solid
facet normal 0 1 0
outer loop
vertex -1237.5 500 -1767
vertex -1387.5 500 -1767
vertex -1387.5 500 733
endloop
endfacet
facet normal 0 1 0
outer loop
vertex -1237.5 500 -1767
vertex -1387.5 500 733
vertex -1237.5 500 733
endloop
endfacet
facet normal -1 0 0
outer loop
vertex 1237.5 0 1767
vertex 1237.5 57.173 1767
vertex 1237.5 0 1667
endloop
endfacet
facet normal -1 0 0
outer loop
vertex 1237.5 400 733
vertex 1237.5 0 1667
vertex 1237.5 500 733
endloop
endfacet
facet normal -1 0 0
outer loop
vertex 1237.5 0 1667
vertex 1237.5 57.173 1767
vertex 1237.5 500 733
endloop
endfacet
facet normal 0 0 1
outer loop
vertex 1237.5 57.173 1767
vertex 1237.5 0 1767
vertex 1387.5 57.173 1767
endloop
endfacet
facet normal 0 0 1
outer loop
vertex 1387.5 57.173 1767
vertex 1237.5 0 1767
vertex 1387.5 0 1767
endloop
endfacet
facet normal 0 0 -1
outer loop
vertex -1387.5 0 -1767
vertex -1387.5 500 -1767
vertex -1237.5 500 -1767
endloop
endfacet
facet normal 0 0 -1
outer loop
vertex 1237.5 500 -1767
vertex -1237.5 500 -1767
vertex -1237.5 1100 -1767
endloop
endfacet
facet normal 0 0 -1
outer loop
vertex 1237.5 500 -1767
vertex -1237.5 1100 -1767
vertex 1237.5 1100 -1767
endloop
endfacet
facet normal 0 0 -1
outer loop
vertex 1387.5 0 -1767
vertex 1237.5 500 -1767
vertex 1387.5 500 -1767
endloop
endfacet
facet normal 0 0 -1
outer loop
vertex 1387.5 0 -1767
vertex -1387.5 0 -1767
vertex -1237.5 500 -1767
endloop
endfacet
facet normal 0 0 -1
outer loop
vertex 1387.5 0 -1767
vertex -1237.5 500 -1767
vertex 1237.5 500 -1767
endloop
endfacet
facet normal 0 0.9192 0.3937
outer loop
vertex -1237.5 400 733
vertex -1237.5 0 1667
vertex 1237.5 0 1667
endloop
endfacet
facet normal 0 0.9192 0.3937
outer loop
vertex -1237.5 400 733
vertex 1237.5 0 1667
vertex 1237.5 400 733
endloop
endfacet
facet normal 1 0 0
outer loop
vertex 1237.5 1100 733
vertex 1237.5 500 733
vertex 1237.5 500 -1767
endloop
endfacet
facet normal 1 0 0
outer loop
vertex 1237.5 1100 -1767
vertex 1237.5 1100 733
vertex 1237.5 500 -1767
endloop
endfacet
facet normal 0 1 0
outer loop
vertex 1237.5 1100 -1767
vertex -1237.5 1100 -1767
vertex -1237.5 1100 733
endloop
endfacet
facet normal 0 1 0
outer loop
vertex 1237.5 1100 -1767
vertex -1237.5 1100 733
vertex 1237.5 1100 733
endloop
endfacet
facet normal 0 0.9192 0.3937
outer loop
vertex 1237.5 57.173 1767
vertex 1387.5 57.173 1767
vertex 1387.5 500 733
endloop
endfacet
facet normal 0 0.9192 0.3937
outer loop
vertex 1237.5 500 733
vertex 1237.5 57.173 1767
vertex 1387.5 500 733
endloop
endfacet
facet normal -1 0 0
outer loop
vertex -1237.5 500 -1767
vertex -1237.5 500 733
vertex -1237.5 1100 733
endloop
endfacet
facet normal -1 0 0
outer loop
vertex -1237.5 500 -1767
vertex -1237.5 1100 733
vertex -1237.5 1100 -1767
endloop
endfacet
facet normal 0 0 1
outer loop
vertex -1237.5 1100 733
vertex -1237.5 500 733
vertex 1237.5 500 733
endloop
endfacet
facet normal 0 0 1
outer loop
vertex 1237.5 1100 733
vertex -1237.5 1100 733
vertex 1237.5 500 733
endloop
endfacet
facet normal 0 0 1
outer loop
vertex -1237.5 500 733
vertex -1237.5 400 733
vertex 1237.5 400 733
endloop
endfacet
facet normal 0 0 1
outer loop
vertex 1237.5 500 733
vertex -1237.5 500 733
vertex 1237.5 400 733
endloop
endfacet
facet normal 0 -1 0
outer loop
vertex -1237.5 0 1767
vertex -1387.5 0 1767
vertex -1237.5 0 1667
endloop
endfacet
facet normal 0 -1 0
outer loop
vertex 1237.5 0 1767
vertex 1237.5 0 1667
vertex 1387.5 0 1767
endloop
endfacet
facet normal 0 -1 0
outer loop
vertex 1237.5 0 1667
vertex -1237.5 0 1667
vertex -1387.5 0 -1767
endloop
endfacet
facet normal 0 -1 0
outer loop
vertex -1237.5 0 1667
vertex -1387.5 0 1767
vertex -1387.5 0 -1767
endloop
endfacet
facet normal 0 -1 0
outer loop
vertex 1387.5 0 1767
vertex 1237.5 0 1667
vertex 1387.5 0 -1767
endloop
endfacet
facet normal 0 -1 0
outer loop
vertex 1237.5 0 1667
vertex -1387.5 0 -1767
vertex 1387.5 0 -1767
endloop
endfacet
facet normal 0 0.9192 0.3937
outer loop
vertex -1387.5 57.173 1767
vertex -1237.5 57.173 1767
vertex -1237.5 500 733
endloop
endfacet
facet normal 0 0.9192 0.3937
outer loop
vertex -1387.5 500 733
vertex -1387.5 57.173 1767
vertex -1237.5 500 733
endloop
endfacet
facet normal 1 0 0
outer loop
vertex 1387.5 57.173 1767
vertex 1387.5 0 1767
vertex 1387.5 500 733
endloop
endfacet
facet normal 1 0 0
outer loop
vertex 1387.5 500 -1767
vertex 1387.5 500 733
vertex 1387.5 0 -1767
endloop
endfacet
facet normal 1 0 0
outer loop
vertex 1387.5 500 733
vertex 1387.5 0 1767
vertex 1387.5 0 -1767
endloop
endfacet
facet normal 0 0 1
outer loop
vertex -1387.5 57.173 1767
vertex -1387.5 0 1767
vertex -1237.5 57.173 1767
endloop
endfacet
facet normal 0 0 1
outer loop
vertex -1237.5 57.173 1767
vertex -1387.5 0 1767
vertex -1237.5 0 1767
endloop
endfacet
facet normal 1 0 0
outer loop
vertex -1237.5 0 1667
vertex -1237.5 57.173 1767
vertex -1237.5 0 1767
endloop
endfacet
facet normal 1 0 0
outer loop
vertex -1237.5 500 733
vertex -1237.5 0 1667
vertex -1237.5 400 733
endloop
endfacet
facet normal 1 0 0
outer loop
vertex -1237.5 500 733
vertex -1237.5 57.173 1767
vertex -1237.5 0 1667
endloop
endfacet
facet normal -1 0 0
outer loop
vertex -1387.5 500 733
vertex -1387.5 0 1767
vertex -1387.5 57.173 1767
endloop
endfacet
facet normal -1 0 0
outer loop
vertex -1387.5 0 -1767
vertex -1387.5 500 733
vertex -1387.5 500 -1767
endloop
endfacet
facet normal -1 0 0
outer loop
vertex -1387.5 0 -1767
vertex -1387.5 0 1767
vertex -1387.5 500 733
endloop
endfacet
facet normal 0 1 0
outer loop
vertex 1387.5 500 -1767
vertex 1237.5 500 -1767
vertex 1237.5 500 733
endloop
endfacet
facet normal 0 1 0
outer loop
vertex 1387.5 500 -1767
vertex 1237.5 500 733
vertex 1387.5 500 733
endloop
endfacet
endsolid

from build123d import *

# Parameters (mm, degrees)
SKETCH_1_W          = 2775
SKETCH_1_H          = 3534
EXTRUDE_1_DEPTH     = 500
CUT_EXTRUDE_1_DEPTH = 3328.598833994
CUT_EXTRUDE_START   = -150
SKETCH_2_3_W        = 2500
SKETCH_2_3_H        = 100
CUT_EXTRUDE_2_DEPTH = 2475
EXTRUDE_START       = -400
SKETCH_3_W          = 2475
SKETCH_3_H          = 2500
EXTRUDE_2_DEPTH     = 1100


with BuildPart() as part:
    # 草图1 → 凸台-拉伸1 (new body)
    with BuildSketch(Plane(origin=(0, 0, 0), x_dir=(1, 0, 0), z_dir=(0, 1, 0))):
        Rectangle(SKETCH_1_W, SKETCH_1_H)
    extrude(amount=EXTRUDE_1_DEPTH)

    # 草图2 → 切除-拉伸1 (cut, through all)
    with BuildSketch(Plane(origin=(1387.5, 0, 0), x_dir=(0, 0, -1), z_dir=(1, 0, 0))):
        Polygon((-1767, 57.173447537), (-733, 500), (-1767, 500), align=None)
    extrude(amount=-CUT_EXTRUDE_1_DEPTH, mode=Mode.SUBTRACT)

    # 草图2<3> → 切除-拉伸2 (cut)
    with BuildSketch(Plane(origin=(1387.5, 0, 0), x_dir=(0, 0, -1), z_dir=(1, 0, 0)).offset(CUT_EXTRUDE_START)):
        Polygon((-1667, 0), (-733, 400), (-733, 500), (-1767, 57.173447537), (-1767, 0), align=None)
        with Locations((517, 450)):
            Rectangle(SKETCH_2_3_W, SKETCH_2_3_H)
    extrude(amount=-CUT_EXTRUDE_2_DEPTH, mode=Mode.SUBTRACT)

    # 草图3 → 凸台-拉伸2 (add)
    with BuildSketch(Plane(origin=(0, 400, 0), x_dir=(1, 0, 0), z_dir=(0, 1, 0)).offset(EXTRUDE_START)):
        with Locations((0, 517)):
            Rectangle(SKETCH_3_W, SKETCH_3_H)
    extrude(amount=EXTRUDE_2_DEPTH)


solid = part.part
